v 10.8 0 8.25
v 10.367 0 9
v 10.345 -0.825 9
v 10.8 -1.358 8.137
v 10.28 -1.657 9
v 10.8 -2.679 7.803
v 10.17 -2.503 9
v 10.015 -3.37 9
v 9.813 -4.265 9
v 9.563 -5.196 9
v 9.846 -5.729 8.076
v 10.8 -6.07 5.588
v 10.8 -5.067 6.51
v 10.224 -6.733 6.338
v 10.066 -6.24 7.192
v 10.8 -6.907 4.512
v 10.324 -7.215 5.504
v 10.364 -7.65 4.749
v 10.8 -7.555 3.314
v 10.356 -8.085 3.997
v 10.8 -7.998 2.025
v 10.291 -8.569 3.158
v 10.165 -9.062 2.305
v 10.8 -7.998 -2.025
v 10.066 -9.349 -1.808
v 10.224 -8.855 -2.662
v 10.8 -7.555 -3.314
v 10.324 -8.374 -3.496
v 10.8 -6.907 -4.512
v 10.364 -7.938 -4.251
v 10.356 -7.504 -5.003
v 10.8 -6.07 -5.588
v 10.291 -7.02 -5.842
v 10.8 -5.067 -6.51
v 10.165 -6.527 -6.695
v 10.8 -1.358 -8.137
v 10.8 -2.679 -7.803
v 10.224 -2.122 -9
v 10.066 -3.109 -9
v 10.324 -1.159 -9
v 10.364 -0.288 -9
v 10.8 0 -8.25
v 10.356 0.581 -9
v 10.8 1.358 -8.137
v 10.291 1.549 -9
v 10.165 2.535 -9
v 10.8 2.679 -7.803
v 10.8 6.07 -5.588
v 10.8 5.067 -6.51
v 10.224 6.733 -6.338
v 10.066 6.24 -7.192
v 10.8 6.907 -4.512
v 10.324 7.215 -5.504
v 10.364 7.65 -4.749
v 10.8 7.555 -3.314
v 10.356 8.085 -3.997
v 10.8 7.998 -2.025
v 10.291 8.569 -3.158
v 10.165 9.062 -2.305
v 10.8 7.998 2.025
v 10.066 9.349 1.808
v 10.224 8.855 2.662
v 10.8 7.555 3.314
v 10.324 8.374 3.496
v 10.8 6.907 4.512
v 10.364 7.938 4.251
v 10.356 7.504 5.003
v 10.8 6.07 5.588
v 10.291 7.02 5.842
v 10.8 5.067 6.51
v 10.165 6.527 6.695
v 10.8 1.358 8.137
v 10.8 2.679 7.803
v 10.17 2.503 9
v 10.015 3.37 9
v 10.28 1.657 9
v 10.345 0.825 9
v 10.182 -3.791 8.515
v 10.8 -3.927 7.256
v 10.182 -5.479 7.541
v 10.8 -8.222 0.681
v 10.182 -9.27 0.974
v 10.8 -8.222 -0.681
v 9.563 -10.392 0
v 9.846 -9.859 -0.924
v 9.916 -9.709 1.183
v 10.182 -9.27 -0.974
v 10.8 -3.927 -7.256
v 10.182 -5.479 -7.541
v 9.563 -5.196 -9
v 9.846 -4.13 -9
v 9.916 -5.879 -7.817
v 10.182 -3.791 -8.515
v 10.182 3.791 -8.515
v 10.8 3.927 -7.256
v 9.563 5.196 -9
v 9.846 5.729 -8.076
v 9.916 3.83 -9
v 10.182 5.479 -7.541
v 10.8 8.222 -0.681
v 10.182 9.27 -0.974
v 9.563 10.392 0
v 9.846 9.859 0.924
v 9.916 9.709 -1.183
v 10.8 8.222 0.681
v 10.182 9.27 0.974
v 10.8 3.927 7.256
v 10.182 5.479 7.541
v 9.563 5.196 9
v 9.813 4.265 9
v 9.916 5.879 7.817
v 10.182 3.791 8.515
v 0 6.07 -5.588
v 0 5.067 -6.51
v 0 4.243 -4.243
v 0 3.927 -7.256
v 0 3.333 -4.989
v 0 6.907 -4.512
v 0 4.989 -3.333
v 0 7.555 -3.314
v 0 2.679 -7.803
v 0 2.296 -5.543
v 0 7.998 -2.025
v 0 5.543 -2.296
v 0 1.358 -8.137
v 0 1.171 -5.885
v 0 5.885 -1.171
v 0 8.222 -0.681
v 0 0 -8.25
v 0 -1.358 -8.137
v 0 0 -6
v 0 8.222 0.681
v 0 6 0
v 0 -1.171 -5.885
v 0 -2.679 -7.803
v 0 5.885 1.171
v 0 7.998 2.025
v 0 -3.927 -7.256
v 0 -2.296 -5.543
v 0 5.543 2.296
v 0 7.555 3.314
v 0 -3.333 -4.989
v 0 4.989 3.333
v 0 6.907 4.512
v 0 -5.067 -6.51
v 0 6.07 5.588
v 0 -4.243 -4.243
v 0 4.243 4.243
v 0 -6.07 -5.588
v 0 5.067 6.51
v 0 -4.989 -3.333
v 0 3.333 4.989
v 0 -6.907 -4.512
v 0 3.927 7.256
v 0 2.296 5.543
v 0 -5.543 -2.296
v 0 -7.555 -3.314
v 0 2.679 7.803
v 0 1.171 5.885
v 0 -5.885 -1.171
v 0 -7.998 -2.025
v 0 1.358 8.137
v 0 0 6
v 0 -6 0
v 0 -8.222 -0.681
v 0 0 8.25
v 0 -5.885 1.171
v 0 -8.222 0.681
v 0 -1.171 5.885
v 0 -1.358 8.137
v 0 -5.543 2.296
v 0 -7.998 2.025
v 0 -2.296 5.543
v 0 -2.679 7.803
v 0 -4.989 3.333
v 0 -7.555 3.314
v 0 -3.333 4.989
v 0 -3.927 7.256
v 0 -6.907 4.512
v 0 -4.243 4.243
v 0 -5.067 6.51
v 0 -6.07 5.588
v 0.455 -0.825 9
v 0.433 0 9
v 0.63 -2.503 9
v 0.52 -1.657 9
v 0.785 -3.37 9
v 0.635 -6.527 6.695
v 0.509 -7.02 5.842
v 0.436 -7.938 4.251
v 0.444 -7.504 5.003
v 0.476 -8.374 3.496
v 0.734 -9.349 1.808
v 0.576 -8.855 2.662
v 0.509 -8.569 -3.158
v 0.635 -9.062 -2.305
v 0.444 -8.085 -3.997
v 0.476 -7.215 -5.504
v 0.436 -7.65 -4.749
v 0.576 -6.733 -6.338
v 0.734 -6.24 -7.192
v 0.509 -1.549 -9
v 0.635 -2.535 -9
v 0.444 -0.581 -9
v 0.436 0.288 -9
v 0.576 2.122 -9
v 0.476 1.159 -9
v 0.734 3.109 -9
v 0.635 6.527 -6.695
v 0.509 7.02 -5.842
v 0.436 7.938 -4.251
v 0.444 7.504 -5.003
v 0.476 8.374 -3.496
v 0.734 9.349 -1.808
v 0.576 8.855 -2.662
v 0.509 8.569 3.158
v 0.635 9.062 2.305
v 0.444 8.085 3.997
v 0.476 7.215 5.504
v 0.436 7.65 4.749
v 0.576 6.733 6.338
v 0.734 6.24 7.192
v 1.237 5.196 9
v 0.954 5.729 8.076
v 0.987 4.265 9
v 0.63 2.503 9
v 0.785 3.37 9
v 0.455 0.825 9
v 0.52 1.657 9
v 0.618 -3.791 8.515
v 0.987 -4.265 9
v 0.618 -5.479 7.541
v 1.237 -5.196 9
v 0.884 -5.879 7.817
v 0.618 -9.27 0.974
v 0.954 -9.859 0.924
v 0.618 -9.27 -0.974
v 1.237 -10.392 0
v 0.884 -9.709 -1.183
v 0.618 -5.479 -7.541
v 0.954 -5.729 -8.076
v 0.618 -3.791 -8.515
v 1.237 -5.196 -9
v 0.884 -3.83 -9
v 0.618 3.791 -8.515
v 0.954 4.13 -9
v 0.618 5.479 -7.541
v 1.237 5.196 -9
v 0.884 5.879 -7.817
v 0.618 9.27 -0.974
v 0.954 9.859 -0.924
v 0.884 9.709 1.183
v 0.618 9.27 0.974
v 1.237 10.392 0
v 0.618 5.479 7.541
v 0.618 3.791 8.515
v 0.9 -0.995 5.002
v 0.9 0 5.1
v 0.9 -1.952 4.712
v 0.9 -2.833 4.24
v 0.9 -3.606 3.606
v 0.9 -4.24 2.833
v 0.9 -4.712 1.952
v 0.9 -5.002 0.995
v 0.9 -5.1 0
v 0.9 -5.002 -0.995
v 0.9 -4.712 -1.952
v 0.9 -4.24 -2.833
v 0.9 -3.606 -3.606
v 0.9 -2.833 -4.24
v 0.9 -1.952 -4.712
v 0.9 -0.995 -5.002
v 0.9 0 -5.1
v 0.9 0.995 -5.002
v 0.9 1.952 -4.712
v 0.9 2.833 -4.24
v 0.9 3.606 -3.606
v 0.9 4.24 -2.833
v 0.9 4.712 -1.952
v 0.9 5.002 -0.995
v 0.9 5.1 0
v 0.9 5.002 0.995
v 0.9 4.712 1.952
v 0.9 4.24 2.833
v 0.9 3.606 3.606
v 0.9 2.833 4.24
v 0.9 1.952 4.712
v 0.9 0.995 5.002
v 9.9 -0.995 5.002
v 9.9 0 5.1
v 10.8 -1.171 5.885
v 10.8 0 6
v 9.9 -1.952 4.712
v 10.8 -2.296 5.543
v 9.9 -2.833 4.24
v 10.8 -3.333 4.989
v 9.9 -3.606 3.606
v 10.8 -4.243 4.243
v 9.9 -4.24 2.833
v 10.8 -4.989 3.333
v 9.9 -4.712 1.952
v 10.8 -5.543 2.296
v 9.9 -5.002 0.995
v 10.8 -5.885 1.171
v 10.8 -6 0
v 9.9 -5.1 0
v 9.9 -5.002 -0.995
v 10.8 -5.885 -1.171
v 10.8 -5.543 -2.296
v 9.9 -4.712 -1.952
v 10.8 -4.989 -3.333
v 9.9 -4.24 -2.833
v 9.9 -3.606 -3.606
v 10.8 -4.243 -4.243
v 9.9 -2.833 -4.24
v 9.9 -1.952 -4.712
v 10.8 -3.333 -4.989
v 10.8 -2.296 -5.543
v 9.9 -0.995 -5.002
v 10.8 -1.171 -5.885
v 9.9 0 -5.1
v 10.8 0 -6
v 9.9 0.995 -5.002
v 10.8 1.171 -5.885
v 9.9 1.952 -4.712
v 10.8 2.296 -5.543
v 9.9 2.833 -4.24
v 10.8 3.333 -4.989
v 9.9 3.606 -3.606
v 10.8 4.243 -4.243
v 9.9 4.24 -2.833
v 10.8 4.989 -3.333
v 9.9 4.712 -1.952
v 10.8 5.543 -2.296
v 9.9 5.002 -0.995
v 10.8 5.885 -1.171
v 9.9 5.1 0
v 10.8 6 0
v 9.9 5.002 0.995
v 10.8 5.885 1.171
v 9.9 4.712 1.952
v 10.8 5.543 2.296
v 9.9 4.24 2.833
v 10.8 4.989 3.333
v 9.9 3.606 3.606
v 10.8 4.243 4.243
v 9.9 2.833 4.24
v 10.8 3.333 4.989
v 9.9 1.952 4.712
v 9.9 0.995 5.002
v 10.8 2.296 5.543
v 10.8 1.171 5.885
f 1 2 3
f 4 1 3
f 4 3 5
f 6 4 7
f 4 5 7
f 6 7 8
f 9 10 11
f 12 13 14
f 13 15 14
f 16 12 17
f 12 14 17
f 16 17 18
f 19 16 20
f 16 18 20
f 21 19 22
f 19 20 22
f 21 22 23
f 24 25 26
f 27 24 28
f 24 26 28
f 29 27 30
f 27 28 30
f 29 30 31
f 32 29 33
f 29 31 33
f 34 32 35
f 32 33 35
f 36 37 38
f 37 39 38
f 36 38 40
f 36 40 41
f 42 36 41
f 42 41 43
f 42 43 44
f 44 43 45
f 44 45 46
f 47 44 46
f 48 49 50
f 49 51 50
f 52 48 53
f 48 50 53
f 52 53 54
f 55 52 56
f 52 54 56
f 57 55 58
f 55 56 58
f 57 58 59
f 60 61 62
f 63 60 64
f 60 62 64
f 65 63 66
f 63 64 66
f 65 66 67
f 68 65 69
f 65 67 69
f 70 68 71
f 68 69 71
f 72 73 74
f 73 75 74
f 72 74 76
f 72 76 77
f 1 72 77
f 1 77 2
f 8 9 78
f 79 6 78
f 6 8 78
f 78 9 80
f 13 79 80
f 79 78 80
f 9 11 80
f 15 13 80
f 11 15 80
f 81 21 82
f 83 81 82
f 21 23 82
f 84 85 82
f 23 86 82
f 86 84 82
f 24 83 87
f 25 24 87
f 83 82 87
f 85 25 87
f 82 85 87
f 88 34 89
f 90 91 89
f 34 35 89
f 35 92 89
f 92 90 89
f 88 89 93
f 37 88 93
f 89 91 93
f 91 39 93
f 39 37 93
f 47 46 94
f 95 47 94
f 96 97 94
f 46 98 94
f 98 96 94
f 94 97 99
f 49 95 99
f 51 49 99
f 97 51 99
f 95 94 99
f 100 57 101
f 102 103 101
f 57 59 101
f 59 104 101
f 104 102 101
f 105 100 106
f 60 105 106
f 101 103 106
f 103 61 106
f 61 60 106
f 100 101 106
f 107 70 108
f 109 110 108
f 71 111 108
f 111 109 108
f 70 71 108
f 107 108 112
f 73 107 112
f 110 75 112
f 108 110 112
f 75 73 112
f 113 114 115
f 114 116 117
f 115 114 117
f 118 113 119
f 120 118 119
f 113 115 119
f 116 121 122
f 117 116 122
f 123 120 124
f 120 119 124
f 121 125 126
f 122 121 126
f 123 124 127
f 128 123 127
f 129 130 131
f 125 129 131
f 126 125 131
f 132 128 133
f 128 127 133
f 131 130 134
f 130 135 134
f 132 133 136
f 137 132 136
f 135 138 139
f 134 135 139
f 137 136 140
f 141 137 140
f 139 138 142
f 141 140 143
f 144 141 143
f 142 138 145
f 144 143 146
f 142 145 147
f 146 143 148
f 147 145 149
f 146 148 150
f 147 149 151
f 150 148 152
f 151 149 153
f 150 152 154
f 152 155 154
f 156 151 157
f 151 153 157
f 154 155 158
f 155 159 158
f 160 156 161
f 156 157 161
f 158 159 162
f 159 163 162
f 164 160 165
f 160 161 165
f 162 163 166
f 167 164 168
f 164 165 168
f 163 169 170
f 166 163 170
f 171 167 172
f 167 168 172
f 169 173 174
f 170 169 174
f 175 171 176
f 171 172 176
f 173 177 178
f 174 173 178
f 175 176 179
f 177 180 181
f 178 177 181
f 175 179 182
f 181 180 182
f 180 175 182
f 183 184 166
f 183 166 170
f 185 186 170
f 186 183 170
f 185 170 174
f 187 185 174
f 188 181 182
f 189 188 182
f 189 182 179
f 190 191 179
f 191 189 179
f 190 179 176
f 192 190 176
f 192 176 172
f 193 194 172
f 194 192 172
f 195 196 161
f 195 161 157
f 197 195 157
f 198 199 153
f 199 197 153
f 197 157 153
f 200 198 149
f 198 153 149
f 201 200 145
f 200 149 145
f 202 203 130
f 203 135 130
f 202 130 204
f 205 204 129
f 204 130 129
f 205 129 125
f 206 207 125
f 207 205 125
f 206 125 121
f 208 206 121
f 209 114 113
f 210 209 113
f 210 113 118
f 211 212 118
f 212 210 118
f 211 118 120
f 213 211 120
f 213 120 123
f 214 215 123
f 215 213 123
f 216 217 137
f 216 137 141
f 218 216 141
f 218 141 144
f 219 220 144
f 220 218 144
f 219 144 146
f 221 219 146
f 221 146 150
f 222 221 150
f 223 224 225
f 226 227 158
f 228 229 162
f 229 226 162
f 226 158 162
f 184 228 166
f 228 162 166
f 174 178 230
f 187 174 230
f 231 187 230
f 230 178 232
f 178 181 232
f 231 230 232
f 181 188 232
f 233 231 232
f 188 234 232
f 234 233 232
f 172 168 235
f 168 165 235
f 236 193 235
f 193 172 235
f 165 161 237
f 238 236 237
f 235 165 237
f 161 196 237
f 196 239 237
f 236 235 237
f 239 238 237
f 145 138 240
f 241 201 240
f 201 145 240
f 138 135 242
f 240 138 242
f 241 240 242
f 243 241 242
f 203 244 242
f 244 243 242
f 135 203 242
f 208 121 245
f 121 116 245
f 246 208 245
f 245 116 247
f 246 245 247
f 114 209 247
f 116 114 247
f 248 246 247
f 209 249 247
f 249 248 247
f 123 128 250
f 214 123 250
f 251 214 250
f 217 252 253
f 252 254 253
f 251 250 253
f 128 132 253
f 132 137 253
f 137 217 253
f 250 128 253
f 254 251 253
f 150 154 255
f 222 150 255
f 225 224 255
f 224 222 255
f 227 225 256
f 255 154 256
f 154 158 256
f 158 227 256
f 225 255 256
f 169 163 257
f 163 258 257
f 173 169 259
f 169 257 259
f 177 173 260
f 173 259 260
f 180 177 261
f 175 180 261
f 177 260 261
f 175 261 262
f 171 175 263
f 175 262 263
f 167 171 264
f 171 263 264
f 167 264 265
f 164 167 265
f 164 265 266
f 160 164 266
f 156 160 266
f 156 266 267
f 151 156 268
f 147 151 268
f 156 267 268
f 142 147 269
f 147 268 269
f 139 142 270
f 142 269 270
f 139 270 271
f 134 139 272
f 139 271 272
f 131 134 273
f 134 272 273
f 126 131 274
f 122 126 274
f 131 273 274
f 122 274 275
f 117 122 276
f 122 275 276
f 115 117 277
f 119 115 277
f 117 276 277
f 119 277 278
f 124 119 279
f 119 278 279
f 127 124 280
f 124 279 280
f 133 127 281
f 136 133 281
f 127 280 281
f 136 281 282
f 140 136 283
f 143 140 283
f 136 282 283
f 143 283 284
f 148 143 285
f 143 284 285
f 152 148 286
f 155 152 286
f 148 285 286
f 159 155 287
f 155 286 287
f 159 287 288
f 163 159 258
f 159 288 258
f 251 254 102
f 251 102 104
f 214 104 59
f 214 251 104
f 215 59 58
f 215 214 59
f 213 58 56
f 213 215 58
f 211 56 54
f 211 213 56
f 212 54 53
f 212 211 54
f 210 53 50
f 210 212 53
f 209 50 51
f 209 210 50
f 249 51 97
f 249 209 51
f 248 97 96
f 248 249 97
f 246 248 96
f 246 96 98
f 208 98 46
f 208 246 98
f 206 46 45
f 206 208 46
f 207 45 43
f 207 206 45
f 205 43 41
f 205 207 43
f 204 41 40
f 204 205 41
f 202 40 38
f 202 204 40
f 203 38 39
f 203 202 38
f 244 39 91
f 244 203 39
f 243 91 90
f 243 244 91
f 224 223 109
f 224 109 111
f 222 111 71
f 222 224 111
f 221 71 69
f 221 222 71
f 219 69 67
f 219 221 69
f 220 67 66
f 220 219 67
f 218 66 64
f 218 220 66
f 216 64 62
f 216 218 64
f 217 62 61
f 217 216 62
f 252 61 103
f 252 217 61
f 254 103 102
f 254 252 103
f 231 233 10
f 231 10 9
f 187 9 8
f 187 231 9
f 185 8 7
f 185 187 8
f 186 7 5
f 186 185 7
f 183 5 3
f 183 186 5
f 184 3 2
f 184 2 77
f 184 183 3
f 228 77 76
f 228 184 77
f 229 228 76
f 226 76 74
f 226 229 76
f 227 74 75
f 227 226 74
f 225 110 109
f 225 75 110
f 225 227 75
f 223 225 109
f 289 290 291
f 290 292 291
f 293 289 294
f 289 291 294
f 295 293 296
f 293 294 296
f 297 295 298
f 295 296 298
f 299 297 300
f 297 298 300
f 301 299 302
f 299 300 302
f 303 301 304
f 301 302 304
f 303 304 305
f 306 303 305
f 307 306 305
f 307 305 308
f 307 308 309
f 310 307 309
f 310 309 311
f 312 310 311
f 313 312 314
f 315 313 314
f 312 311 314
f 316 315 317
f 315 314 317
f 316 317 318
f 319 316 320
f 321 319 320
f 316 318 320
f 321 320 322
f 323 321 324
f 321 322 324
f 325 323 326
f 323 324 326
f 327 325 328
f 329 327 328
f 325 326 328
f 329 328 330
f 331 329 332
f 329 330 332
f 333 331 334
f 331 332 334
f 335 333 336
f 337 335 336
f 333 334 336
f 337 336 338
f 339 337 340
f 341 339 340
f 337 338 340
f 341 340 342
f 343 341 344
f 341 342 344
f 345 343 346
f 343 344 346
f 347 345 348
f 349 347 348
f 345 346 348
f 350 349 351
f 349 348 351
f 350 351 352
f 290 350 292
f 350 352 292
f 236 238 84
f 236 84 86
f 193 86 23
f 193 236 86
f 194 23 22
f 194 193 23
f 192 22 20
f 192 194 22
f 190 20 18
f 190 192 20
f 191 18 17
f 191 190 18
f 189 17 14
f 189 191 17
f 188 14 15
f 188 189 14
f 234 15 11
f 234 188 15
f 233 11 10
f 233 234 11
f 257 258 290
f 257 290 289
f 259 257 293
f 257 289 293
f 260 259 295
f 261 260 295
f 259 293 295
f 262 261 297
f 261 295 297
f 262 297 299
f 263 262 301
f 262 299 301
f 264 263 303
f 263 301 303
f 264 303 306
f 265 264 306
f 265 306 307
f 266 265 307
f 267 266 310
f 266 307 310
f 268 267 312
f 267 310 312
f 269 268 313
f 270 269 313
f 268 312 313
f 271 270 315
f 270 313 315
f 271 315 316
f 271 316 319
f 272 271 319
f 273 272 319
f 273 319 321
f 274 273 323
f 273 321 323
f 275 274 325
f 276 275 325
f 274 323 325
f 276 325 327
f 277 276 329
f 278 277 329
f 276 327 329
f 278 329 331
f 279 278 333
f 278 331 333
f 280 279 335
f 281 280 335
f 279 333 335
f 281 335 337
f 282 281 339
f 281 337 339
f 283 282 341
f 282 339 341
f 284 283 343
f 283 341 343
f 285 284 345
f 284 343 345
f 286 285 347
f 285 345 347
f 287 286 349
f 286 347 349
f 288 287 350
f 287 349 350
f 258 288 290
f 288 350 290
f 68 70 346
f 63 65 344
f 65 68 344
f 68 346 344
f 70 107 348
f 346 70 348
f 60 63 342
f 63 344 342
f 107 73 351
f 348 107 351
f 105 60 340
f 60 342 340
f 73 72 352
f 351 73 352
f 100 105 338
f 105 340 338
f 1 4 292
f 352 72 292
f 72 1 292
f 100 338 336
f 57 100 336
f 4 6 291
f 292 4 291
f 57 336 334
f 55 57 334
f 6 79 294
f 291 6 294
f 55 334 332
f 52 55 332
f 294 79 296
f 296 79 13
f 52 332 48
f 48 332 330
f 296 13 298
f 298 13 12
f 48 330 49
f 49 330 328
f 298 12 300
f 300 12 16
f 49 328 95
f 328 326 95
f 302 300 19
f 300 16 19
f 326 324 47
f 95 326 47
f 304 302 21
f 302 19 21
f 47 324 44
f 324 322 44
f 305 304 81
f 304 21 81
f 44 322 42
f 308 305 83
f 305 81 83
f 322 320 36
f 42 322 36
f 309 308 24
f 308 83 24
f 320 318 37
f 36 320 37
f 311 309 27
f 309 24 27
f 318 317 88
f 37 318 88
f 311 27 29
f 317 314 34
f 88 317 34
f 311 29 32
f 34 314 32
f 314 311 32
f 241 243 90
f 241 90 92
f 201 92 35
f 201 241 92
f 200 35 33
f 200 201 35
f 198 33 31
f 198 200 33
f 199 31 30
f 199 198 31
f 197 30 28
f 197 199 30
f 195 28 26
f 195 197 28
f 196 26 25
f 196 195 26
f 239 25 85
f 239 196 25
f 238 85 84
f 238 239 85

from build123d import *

# Parameters (mm, degrees)
SKETCH_2_OUTSIDE_W  = 30.08
SKETCH_2_OUTSIDE_H  = 30.08
CUT_EXTRUDE_1_DEPTH = 19.706148722


with BuildPart() as part:
    # Эскиз1 → Повернуть1 (revolve)
    with BuildSketch(Plane.XY, mode=Mode.PRIVATE) as revolve_1_sk:
        Polygon((0.9, 5.1), (9.9, 5.1), (10.8, 6), (10.8, 8.25), (9.327756814, 10.8), (1.472243186, 10.8), (0, 8.25), (0, 6), align=None)
    revolve(revolve_1_sk.sketch.rotate(Axis((0, 0, 0), (1, 0, 0)), 90), axis=Axis((0, 0, 0), (1, 0, 0)))

    # Эскиз2 outside → Вырез-Вытянуть1 (cut, through all)
    with BuildSketch(Plane.ZY):
        Rectangle(SKETCH_2_OUTSIDE_W, SKETCH_2_OUTSIDE_H)
        Polygon((0, 10.392304845), (-9, 5.196152423), (-9, -5.196152423), (0, -10.392304845), (9, -5.196152423), (9, 5.196152423), align=None, mode=Mode.SUBTRACT)
    extrude(amount=-CUT_EXTRUDE_1_DEPTH, mode=Mode.SUBTRACT)


solid = part.part
